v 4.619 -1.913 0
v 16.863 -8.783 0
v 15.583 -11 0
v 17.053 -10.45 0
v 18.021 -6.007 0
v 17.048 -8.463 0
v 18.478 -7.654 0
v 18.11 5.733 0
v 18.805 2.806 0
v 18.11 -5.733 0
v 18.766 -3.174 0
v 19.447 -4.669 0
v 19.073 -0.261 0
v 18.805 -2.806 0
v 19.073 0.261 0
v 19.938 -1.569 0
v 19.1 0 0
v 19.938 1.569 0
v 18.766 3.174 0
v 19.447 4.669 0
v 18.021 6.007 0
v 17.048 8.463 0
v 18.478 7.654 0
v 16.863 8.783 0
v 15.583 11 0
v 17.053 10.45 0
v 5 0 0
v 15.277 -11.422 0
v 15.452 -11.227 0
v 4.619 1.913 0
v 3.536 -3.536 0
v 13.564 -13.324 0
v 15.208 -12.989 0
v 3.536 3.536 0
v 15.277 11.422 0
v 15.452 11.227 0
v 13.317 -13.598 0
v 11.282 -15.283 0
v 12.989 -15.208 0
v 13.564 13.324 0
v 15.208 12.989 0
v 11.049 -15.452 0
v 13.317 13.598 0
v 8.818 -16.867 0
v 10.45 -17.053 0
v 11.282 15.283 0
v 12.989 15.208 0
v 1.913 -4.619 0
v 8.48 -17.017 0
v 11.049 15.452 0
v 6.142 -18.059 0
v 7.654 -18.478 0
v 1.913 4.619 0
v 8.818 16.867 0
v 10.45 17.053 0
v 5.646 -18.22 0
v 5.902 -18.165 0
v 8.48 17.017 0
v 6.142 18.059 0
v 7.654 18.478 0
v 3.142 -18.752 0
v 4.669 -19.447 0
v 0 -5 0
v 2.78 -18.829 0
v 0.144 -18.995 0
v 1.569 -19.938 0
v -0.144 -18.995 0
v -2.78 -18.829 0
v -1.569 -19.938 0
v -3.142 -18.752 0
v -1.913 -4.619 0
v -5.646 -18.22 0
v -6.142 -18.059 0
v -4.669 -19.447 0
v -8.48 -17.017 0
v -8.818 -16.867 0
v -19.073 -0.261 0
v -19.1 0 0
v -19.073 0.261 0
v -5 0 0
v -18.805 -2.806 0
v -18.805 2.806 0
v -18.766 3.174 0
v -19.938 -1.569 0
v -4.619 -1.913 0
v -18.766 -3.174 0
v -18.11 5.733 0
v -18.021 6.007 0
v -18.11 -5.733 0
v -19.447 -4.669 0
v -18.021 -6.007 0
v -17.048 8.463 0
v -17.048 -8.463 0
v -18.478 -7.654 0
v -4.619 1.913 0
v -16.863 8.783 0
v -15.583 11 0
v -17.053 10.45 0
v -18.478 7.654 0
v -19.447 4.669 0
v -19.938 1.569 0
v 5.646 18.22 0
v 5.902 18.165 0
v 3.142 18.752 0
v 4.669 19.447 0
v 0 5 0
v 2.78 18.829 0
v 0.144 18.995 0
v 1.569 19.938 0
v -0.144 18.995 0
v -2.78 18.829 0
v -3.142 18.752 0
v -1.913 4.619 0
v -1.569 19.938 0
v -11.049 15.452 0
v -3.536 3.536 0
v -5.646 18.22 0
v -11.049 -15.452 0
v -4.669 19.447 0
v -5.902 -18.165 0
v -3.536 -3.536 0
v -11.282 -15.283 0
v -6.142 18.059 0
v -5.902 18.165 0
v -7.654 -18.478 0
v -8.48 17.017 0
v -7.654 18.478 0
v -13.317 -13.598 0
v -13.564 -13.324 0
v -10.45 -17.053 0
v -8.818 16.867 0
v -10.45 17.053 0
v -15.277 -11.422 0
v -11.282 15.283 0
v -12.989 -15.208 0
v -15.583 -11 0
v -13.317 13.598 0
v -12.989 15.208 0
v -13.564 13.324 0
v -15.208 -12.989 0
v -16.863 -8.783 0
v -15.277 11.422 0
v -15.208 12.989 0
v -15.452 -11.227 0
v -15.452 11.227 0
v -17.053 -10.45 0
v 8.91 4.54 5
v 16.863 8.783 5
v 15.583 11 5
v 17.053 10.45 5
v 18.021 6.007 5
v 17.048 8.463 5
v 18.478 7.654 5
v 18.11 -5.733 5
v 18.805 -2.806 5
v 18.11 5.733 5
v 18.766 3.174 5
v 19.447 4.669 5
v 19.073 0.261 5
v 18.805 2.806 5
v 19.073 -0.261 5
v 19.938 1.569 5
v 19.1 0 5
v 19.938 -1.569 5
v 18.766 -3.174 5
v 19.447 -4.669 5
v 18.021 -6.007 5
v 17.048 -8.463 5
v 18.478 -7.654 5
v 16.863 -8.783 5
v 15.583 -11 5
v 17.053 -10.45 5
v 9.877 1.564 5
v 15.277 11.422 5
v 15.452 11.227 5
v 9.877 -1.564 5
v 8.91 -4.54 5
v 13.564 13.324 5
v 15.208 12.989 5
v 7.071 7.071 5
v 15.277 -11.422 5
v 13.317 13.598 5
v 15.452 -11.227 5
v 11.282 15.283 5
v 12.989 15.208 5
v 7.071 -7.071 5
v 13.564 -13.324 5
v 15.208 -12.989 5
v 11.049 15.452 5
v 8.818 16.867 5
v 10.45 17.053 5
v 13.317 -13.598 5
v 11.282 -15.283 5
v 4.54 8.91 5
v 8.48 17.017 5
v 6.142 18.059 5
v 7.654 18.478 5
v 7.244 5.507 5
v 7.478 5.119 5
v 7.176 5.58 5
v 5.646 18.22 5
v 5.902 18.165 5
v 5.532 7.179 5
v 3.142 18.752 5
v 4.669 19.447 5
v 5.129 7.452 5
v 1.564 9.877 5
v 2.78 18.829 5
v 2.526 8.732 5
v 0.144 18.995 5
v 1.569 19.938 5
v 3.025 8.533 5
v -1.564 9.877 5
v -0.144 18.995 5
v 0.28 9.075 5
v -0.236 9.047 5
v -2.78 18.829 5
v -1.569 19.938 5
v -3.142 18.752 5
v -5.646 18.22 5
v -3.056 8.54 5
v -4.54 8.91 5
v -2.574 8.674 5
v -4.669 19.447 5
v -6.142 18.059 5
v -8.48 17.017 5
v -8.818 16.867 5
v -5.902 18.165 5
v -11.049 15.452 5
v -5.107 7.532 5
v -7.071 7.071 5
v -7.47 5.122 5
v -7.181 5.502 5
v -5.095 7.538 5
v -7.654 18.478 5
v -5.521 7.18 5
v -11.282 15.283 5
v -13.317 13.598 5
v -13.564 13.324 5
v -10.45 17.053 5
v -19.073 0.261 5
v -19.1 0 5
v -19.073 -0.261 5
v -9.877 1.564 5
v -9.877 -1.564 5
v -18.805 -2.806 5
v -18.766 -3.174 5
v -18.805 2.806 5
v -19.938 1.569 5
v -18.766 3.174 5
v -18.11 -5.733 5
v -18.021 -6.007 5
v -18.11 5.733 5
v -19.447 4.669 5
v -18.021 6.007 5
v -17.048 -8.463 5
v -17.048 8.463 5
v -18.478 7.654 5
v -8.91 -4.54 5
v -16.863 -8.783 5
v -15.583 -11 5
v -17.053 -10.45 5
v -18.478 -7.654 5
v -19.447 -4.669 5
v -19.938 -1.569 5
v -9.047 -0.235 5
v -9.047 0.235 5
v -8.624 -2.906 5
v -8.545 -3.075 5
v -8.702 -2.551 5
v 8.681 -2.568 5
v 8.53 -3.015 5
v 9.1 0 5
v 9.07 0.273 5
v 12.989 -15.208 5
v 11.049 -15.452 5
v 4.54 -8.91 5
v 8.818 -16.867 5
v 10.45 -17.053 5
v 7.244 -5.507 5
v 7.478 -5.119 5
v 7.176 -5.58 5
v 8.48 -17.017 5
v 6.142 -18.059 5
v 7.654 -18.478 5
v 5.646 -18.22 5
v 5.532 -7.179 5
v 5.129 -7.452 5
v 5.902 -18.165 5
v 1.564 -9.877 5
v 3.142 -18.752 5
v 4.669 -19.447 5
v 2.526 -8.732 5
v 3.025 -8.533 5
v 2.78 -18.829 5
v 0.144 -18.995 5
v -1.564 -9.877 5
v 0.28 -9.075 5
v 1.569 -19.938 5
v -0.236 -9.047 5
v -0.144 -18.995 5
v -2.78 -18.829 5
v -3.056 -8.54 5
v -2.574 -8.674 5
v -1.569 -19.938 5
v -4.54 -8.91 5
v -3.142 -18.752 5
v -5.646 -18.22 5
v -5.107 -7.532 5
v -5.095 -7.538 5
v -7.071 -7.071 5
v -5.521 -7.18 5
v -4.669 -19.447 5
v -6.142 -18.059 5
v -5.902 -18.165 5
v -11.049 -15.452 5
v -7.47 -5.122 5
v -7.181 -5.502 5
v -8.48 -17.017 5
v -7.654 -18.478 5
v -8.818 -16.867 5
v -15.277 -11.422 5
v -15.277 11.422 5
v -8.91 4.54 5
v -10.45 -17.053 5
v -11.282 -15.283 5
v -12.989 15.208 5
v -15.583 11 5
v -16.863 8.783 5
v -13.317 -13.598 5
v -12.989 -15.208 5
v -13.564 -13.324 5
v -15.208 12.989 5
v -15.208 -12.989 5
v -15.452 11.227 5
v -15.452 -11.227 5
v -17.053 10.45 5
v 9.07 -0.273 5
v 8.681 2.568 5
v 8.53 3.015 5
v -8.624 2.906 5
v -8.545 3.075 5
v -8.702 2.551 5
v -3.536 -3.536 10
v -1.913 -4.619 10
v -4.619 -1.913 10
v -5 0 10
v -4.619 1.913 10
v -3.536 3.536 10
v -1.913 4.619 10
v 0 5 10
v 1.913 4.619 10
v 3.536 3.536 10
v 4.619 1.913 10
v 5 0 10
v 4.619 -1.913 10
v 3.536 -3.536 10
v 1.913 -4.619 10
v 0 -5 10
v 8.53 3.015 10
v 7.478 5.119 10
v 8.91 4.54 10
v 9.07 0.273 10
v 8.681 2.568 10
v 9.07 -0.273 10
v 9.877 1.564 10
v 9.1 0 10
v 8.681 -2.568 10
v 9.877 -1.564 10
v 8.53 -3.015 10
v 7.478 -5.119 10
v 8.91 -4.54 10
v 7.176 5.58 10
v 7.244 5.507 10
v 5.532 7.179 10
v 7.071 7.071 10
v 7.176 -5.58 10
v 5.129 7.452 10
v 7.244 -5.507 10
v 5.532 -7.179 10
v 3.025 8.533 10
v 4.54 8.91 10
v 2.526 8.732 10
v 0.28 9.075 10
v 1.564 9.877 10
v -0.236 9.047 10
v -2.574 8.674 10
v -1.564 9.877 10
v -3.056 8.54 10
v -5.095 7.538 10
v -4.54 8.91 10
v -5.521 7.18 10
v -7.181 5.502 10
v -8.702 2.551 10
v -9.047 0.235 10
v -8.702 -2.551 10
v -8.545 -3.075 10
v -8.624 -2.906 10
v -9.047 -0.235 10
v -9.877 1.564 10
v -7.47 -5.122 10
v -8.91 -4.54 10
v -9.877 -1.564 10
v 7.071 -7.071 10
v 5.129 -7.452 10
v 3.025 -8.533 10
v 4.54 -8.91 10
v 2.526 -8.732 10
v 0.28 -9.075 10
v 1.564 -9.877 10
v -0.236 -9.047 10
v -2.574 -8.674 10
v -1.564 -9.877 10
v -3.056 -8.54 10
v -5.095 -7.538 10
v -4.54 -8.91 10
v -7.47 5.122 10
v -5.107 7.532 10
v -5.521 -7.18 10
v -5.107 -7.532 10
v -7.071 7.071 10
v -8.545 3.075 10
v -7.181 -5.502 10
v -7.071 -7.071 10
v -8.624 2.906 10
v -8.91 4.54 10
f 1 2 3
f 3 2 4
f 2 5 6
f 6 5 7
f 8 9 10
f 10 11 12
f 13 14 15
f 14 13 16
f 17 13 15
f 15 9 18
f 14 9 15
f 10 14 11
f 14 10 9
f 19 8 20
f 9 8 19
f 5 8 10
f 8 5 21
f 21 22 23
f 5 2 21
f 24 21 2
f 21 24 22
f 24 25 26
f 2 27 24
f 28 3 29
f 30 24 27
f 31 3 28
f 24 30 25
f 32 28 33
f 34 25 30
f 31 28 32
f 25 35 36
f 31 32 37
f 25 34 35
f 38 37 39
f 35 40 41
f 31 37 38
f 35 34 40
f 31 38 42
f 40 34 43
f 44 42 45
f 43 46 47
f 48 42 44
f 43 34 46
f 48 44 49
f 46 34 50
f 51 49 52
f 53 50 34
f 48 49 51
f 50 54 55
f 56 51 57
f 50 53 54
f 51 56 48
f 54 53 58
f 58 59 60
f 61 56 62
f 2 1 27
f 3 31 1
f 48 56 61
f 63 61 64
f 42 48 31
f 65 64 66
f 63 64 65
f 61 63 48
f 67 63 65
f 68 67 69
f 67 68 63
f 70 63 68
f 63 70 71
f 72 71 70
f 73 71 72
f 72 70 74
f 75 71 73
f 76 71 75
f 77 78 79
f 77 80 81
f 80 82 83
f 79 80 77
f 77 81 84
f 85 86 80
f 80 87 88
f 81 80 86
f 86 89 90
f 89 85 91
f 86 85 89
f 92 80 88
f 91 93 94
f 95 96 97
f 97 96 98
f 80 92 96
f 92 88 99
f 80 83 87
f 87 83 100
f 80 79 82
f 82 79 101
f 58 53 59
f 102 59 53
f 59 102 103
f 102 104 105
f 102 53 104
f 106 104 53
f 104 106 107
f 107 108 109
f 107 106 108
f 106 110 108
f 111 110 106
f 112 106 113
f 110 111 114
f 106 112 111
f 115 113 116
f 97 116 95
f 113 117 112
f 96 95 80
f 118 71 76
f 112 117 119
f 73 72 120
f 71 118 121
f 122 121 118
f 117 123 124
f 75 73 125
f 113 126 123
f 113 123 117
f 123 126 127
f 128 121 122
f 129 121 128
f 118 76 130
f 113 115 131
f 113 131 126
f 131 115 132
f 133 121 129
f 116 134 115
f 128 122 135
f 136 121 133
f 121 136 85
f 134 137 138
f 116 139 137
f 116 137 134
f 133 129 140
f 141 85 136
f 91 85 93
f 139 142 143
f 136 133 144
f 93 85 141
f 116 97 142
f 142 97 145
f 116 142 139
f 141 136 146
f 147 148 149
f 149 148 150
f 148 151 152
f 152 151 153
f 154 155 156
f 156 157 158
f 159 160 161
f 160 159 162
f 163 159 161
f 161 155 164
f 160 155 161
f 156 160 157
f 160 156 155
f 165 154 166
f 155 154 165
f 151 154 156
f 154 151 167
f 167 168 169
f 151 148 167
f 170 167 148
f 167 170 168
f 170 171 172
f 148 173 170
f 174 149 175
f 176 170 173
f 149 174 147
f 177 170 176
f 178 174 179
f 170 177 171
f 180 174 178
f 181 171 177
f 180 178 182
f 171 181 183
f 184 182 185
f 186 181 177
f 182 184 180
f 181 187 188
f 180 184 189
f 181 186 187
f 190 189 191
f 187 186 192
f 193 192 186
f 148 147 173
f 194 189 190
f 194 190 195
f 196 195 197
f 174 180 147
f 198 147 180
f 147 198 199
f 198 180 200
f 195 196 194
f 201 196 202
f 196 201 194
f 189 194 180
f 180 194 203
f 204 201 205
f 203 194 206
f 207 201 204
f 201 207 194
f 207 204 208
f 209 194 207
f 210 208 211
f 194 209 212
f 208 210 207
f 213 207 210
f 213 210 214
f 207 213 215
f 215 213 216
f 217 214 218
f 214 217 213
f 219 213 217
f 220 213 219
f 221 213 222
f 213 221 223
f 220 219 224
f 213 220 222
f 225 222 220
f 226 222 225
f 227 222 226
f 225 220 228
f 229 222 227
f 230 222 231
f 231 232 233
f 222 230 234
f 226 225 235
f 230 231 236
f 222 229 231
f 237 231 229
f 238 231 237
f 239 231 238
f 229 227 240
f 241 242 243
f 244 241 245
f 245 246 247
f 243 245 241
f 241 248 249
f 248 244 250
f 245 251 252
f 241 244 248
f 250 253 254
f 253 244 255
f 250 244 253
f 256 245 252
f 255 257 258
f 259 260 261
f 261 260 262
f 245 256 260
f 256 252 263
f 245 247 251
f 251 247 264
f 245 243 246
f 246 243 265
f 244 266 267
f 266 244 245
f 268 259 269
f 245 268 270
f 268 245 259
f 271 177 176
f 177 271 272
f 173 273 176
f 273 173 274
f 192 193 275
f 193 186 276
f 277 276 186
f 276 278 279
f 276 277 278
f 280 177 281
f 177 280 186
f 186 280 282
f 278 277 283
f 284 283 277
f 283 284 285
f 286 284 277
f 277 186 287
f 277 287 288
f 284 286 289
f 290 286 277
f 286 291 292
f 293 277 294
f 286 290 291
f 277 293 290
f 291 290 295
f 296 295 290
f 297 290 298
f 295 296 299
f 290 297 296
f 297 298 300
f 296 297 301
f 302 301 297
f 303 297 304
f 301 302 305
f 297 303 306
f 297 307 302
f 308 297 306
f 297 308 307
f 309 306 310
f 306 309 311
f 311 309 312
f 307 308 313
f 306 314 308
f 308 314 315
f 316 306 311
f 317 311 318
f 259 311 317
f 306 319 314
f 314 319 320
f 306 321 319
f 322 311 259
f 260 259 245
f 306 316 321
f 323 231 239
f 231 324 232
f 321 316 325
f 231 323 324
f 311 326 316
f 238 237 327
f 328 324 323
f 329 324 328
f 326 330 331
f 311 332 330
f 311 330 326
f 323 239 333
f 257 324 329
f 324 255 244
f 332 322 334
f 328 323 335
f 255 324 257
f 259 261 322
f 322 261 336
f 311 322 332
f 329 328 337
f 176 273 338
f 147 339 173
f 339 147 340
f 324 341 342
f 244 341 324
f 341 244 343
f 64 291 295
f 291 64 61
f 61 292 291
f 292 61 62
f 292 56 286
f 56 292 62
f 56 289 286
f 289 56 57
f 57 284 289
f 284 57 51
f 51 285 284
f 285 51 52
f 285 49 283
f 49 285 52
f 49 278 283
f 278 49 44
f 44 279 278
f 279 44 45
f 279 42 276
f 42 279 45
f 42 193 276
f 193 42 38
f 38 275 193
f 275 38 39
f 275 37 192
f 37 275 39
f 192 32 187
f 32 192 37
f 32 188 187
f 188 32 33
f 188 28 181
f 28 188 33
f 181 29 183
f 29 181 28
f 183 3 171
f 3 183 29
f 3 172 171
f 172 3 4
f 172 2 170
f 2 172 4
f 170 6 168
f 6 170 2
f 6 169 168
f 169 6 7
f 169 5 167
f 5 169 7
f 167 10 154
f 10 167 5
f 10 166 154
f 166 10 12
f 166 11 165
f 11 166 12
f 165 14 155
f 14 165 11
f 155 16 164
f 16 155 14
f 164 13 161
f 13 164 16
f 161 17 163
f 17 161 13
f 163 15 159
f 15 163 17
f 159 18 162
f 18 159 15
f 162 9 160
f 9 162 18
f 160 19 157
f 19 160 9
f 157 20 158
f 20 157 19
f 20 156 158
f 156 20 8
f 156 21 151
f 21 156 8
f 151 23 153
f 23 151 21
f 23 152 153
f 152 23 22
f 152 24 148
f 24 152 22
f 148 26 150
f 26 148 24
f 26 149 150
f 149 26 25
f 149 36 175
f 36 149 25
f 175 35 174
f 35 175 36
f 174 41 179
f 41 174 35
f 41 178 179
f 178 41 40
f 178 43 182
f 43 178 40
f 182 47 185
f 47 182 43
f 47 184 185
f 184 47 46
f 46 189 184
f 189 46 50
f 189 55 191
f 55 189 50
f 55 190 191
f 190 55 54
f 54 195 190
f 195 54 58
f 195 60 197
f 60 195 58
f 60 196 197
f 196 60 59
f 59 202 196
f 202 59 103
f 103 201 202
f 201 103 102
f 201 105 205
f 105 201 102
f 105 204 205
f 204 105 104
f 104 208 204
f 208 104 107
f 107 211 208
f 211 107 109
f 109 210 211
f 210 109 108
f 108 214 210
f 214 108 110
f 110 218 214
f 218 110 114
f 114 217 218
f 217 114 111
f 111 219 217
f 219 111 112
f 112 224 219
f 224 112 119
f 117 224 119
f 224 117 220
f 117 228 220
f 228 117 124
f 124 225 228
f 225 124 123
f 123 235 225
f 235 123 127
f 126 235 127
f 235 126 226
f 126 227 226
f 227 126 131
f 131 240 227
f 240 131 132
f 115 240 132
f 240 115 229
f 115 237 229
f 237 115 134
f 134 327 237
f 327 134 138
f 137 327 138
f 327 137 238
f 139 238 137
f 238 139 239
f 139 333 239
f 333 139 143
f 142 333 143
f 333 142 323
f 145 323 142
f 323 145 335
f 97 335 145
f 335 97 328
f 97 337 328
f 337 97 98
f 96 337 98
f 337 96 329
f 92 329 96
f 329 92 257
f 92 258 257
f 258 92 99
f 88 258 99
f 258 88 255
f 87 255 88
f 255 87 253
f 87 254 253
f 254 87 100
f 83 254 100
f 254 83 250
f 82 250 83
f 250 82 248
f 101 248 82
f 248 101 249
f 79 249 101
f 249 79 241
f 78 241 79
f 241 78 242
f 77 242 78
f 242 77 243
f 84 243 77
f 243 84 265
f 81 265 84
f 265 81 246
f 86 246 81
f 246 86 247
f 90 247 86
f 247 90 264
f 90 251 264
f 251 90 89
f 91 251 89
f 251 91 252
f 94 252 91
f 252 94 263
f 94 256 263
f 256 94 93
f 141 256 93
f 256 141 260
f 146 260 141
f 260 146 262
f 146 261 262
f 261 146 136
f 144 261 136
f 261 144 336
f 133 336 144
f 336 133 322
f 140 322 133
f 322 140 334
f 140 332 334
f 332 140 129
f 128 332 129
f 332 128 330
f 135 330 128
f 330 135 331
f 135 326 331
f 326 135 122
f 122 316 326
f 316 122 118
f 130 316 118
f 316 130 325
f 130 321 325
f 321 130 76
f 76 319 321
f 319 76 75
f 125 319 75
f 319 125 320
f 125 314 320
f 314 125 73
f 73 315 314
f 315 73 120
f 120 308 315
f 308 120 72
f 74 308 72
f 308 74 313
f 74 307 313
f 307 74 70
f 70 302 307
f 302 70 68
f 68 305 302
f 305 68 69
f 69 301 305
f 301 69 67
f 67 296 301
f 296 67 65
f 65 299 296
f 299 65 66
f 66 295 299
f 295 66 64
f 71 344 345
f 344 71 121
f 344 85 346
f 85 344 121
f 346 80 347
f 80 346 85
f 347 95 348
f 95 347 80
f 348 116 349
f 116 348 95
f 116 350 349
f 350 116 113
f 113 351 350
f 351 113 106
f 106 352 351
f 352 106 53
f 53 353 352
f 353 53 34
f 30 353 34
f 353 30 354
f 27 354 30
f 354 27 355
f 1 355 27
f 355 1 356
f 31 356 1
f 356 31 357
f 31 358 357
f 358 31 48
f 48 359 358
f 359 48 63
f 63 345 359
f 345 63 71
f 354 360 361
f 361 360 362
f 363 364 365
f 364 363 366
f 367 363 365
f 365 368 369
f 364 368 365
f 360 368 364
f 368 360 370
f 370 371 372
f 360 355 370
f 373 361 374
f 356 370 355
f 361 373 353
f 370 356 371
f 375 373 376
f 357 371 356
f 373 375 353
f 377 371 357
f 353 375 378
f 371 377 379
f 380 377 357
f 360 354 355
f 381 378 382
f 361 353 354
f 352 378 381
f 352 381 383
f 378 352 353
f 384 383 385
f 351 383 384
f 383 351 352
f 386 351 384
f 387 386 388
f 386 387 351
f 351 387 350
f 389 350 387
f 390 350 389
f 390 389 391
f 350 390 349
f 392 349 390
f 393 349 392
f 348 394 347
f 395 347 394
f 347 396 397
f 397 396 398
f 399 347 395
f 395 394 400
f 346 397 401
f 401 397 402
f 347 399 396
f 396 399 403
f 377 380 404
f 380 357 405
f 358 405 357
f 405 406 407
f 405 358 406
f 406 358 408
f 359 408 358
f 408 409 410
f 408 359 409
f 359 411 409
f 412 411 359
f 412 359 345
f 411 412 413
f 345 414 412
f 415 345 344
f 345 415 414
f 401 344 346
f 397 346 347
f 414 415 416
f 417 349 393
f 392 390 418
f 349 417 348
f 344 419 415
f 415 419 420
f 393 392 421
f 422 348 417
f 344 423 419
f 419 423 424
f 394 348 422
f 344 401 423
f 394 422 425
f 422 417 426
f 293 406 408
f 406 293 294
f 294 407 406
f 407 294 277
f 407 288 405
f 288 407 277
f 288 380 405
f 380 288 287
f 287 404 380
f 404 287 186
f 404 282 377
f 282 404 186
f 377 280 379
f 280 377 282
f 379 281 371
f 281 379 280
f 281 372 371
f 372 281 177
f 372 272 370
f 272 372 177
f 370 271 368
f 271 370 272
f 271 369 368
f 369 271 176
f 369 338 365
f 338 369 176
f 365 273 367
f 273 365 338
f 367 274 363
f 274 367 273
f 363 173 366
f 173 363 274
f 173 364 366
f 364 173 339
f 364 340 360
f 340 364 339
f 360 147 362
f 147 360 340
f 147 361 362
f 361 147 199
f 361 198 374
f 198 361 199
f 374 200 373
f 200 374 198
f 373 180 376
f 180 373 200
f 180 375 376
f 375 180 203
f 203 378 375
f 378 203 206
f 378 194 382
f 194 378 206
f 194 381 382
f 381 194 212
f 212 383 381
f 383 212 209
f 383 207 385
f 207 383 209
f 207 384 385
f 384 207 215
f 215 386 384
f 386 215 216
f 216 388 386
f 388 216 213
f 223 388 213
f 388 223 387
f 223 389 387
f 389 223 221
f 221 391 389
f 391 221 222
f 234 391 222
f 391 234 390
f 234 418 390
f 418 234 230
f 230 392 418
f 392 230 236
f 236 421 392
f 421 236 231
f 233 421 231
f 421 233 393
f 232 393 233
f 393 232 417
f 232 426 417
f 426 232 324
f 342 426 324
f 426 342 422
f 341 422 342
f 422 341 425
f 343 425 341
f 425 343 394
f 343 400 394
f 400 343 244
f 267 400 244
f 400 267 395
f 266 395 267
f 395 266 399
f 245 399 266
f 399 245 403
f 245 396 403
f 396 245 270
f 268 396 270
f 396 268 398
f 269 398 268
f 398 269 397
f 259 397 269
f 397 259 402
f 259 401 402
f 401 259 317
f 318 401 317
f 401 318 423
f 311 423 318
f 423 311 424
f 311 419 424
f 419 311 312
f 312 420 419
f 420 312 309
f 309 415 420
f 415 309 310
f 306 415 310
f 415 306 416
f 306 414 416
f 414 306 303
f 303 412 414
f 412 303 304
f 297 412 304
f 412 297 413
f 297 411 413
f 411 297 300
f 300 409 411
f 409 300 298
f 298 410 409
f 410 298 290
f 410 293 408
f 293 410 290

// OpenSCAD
// [FL_INDEX: keywords="openscad, 3d_parametric, customizable_gear_thing, csg_solid" | COT="Parametric OpenSCAD design from 3DCodeverse"]
// Title: customizable gear thing

//CUSTOMIZER VARIABLES

//radius of the bottom gear (to edge of teeth)
_Radius_1 = 20;//[6:50]
//radius of the center hole
_Radius_center = 5;//[0:20]
// number of teeth on the bottom gear
_Teeth_1 = 40;//[6:60]
//height of the bottom gear
_Height_1 = 5;//[1:10]
//radius of the top gear (to edge of teeth)
_Radius_2 = 10;//[6:50]
//number of teeth on the top gear
_Teeth_2 = 20;//[6:60]
//height of the top gear
_Height_2 = 5;//[1:10]

//CUSTOMIZER VARIABLES END

r = _Radius_1*1;
rc = _Radius_center * 1;
t = _Teeth_1*1;
h = _Height_1*1;

r2 = _Radius_2*1;
t2 = _Teeth_2*1;
h2 = _Height_2*1;

 
module gear()
{
  q = 360/t;
  w = q/2;
difference()
{
  circle(r-.9);
  circle(rc);
}
  for(i=[0:t])
  {
    polygon([[sin(i*q)*(r-1.1),cos(i*q)*(r-1.1)],[sin((i*q)+w)*(r),cos((i*q)+w)*(r)],[sin((i+1)*q)*(r-1.1),cos((i+1)*q)*(r-1.1)]]);
  }
}

module gear2()
{
 
  q2 = 360/t2;
  w2 = q2/2;
difference()
{
  circle(r2-.9);
  circle(rc);
}

  for(i=[0:t2])
  {
    polygon([[sin(i*q2)*(r2-1.1),cos(i*q2)*(r2-1.1)],[sin((i*q2)+w2)*(r2),cos((i*q2)+w2)*(r2)],[sin((i+1)*q2)*(r2-1.1),cos((i+1)*q2)*(r2-1.1)]]);
  }
}
module final()
{

union(){
 // cylinder((h+h2),rc+1,rc+1);
  linear_extrude(height=h)
    gear(); 

  translate([0,0,h])
  linear_extrude(height=h2)
    gear2(); 
  }

}

//difference(){
final();
//cylinder((h+h2),rc,rc);
//}
